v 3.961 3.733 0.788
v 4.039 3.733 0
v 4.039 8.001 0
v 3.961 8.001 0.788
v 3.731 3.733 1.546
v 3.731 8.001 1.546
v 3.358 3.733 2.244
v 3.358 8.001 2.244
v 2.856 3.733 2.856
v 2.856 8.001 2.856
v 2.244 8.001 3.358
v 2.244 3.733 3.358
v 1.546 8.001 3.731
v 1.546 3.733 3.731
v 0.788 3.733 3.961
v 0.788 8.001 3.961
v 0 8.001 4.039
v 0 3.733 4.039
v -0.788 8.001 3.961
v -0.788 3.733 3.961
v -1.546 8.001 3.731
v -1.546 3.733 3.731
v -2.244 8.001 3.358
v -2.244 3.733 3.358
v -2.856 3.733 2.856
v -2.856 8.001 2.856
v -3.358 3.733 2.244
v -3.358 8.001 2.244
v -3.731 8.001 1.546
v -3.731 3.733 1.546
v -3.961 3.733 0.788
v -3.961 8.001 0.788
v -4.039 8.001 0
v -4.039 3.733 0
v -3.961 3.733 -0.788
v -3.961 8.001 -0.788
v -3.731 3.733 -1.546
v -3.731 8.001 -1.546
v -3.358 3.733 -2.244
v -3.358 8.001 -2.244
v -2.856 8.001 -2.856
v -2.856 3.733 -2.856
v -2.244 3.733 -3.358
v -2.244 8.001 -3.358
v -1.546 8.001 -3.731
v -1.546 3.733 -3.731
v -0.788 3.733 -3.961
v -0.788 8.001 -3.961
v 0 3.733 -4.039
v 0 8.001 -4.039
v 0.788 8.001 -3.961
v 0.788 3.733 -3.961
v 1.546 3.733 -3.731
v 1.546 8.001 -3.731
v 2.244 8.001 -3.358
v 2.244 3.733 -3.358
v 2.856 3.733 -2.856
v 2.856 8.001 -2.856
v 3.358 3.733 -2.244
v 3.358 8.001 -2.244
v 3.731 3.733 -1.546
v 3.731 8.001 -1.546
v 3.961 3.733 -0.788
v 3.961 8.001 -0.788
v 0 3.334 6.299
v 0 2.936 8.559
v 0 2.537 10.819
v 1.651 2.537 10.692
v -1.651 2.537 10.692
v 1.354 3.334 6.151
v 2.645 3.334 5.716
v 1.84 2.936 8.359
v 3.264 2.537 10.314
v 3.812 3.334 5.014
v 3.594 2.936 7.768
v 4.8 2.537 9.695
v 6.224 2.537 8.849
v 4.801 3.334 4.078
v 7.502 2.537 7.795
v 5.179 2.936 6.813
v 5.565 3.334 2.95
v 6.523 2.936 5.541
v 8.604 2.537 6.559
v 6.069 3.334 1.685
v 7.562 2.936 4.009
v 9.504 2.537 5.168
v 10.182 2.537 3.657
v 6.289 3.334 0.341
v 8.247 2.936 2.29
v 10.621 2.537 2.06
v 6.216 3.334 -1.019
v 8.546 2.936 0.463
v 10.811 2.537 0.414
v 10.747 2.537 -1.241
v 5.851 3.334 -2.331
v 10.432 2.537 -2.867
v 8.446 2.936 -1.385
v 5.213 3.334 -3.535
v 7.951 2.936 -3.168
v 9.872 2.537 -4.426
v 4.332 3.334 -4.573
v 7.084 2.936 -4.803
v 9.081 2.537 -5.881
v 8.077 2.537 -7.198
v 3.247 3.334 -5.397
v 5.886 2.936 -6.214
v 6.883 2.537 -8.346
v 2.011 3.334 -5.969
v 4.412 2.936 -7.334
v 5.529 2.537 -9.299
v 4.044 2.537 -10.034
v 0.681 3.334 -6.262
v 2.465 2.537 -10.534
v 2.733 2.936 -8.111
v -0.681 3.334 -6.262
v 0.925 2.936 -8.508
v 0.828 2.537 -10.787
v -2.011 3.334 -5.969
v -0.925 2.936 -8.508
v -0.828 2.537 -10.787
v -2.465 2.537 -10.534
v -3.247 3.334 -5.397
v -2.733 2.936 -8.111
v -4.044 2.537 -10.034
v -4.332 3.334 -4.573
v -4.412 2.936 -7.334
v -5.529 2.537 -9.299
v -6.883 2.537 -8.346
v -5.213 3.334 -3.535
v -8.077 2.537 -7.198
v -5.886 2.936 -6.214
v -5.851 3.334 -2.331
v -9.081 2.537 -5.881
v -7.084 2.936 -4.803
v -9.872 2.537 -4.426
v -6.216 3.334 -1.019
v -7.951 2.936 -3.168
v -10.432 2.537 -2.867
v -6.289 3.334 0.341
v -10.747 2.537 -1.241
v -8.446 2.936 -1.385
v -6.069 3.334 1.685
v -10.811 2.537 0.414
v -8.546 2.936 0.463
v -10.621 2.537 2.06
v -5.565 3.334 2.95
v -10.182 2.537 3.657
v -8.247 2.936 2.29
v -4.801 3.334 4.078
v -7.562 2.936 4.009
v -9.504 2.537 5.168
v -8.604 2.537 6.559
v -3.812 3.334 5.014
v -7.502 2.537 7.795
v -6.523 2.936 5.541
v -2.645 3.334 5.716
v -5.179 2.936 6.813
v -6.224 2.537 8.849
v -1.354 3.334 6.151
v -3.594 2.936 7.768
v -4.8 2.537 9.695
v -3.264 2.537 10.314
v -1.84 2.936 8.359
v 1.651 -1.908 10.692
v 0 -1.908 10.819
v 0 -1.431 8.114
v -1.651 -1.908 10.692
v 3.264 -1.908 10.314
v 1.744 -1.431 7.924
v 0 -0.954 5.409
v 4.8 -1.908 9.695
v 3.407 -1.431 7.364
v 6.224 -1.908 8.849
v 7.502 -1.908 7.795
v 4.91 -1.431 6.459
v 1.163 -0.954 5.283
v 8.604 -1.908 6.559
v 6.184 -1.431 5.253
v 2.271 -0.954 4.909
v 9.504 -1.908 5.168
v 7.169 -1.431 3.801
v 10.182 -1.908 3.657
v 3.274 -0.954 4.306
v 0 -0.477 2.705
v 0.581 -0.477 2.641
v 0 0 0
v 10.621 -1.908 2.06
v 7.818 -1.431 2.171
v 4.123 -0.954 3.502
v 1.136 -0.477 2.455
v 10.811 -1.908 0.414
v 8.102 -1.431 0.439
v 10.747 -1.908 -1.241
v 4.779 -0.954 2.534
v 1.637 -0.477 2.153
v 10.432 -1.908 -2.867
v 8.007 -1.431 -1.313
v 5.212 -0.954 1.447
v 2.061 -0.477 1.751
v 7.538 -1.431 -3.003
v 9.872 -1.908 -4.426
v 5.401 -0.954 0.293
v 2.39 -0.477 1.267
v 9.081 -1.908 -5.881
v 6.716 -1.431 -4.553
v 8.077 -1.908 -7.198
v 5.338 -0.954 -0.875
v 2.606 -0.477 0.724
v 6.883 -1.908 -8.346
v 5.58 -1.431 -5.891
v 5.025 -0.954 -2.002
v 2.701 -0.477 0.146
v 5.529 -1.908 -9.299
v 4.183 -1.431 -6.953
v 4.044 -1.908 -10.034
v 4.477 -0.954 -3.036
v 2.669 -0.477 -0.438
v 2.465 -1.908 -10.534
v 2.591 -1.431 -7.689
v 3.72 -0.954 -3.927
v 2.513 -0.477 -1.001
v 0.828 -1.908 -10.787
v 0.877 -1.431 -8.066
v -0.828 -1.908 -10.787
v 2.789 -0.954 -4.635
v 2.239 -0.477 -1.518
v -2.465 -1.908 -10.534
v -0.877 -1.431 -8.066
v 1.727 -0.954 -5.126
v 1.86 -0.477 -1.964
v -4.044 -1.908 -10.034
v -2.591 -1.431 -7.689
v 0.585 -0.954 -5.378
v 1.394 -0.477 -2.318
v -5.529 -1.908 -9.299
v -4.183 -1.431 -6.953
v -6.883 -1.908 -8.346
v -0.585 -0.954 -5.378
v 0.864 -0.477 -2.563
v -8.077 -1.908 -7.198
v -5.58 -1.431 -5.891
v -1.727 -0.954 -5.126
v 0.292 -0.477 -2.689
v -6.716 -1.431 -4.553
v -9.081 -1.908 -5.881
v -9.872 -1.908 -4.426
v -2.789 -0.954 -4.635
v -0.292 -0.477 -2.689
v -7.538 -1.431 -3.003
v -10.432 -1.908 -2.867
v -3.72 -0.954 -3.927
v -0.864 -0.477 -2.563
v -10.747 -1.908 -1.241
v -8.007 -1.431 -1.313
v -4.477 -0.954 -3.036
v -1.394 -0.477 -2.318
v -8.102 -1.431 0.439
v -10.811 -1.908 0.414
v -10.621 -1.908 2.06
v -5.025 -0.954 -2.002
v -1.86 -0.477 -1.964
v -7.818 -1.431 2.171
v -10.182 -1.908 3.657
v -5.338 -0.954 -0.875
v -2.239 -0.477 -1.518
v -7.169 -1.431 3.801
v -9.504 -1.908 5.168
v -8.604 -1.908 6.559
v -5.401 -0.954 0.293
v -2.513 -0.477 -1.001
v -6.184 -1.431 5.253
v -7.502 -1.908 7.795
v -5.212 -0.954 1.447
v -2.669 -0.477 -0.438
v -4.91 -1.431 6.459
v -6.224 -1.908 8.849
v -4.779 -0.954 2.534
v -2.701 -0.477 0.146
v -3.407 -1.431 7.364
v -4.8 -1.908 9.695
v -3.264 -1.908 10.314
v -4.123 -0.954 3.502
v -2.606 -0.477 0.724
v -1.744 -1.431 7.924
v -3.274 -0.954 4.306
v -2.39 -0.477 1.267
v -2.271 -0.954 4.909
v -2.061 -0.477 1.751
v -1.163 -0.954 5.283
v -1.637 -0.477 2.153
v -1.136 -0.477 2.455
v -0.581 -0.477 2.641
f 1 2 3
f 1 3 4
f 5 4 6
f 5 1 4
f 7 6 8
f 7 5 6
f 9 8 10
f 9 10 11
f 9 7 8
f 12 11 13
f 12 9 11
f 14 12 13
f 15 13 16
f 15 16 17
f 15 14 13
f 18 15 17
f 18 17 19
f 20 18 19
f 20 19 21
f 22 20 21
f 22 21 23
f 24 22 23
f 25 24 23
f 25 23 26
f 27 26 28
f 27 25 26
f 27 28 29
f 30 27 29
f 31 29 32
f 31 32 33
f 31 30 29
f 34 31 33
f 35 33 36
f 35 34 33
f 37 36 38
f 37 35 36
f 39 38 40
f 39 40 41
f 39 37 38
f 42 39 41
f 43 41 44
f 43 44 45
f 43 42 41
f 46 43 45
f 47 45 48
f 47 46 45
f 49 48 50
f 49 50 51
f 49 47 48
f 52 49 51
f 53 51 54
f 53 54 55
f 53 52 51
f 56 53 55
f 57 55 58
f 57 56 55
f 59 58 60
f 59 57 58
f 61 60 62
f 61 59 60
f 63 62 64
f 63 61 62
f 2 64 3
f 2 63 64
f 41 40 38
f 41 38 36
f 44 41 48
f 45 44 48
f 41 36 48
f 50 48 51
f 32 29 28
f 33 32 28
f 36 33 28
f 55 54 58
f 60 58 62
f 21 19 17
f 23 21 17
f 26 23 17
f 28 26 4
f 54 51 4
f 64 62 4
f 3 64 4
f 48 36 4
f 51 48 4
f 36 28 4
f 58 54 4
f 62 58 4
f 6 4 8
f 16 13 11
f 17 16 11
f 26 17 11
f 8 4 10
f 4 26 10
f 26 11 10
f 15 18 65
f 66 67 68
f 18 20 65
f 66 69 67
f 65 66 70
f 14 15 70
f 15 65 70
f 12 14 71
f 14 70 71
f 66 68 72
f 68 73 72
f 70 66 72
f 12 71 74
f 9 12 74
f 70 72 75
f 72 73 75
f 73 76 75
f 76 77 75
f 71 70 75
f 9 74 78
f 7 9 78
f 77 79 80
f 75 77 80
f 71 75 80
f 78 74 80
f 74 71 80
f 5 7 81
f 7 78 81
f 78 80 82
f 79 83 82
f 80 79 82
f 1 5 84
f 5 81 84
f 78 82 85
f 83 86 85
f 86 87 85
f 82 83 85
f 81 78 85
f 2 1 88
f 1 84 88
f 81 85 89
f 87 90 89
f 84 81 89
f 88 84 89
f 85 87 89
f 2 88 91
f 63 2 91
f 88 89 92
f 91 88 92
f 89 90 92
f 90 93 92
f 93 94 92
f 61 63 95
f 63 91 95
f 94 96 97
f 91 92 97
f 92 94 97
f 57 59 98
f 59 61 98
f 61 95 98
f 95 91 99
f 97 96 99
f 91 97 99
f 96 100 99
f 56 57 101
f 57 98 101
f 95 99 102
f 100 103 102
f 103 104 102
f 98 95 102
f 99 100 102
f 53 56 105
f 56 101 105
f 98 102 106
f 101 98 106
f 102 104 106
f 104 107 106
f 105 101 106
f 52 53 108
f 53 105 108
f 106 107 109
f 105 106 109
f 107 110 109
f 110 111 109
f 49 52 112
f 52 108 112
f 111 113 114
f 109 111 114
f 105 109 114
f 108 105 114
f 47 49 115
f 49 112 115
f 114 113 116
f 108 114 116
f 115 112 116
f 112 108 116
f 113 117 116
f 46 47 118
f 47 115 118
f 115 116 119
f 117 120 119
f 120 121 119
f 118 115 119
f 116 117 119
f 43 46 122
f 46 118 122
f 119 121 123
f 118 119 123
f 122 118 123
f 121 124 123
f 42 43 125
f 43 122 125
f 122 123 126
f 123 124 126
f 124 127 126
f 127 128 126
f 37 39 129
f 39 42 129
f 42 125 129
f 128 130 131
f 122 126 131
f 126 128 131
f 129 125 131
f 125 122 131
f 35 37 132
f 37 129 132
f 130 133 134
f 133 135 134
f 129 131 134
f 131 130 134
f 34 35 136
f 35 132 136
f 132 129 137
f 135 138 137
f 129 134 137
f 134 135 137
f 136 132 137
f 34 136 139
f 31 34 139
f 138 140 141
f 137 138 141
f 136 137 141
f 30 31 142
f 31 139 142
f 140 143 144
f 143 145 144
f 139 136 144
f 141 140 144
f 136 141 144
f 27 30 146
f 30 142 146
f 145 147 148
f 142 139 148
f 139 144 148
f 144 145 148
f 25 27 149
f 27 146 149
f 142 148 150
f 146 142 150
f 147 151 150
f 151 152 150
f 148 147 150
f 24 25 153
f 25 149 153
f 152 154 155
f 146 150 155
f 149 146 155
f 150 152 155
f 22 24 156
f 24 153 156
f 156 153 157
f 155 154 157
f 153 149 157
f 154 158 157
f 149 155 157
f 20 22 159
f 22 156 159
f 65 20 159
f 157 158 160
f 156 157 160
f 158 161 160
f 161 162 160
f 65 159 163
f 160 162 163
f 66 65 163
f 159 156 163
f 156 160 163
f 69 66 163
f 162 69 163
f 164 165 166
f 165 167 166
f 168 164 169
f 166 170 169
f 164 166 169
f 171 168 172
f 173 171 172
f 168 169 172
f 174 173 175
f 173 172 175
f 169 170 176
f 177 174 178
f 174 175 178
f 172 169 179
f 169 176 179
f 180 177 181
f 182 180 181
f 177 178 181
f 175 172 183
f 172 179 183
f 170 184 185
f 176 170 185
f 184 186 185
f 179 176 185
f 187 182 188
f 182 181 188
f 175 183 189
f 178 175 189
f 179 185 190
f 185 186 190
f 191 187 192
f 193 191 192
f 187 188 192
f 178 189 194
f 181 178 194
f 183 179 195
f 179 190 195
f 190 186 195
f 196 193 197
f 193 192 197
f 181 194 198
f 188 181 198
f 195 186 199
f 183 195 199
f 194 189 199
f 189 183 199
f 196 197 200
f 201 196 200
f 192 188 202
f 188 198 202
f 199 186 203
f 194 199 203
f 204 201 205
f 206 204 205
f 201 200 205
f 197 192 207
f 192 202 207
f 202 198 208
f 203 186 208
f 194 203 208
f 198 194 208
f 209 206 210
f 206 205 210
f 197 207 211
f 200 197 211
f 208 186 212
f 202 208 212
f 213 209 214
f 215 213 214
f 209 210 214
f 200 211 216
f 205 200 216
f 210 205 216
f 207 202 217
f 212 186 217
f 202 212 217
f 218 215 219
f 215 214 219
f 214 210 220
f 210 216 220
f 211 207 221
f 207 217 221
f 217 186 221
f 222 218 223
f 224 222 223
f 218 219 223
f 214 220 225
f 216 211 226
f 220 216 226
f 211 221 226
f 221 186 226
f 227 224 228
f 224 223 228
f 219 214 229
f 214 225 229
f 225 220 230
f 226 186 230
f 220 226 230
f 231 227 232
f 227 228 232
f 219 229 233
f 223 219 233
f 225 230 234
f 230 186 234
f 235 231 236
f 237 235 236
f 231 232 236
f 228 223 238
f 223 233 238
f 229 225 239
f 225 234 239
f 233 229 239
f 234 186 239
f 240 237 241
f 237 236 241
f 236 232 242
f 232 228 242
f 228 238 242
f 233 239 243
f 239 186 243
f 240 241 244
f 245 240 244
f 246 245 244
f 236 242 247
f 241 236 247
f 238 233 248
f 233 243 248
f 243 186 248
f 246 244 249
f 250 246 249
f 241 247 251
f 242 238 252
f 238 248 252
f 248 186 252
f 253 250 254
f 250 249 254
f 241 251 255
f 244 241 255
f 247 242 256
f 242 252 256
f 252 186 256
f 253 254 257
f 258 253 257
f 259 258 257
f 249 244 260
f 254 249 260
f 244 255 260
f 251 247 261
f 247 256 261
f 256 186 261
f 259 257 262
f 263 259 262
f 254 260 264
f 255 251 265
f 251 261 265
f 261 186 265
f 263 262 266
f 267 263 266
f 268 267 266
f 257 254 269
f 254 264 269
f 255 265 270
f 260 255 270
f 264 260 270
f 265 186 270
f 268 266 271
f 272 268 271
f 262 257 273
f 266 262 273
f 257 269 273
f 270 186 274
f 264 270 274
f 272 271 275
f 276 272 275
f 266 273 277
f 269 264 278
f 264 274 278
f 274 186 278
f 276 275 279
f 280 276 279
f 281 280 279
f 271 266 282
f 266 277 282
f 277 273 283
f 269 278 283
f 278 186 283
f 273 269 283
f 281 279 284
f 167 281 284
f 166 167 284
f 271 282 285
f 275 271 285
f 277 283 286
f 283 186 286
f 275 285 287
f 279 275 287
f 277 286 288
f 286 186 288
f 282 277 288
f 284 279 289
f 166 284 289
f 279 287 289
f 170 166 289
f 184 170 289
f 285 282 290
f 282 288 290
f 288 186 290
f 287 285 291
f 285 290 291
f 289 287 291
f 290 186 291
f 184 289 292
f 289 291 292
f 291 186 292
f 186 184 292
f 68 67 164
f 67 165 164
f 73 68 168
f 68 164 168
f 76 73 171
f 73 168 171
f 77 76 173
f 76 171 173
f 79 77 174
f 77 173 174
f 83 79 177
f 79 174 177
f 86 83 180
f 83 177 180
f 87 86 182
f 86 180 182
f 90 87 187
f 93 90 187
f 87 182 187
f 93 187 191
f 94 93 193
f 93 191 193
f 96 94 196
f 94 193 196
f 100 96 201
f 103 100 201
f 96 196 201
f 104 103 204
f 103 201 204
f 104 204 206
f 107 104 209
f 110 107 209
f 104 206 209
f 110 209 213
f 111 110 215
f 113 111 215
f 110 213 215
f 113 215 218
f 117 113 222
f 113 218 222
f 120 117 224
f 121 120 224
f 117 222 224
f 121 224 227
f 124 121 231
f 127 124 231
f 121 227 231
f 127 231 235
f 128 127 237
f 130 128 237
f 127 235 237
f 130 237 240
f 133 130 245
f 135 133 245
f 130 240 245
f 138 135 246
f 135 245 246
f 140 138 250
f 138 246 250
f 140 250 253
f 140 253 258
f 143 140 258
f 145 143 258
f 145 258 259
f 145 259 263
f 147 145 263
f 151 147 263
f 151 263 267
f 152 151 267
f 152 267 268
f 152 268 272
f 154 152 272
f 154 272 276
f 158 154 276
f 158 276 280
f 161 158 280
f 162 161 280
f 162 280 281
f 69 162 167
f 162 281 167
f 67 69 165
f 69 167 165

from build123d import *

# Parameters (mm, degrees)
F2_R     = 4.0386
F3_DEPTH = 3.4925
F4_DEPTH = 8.001


with BuildPart() as f1:
    # F0 (on Right) → F1 (revolve)
    with BuildSketch(Plane.YZ):
        Polygon((-1.907612, 10.818606), (0, 0), (4.445, 0), (2.537388, 10.818606), align=None)
    revolve(axis=Axis((0, 0.105105, 0), (0, 1, 0)))

    # F2 (on Front) → F3 (join)
    with BuildSketch(Plane.XZ):
        Circle(F2_R)
    extrude(amount=-F3_DEPTH)

    # F2 (on Front) → F4 (join)
    with BuildSketch(Plane.XZ):
        Circle(F2_R)
    extrude(amount=-F4_DEPTH)


solid = f1.part
